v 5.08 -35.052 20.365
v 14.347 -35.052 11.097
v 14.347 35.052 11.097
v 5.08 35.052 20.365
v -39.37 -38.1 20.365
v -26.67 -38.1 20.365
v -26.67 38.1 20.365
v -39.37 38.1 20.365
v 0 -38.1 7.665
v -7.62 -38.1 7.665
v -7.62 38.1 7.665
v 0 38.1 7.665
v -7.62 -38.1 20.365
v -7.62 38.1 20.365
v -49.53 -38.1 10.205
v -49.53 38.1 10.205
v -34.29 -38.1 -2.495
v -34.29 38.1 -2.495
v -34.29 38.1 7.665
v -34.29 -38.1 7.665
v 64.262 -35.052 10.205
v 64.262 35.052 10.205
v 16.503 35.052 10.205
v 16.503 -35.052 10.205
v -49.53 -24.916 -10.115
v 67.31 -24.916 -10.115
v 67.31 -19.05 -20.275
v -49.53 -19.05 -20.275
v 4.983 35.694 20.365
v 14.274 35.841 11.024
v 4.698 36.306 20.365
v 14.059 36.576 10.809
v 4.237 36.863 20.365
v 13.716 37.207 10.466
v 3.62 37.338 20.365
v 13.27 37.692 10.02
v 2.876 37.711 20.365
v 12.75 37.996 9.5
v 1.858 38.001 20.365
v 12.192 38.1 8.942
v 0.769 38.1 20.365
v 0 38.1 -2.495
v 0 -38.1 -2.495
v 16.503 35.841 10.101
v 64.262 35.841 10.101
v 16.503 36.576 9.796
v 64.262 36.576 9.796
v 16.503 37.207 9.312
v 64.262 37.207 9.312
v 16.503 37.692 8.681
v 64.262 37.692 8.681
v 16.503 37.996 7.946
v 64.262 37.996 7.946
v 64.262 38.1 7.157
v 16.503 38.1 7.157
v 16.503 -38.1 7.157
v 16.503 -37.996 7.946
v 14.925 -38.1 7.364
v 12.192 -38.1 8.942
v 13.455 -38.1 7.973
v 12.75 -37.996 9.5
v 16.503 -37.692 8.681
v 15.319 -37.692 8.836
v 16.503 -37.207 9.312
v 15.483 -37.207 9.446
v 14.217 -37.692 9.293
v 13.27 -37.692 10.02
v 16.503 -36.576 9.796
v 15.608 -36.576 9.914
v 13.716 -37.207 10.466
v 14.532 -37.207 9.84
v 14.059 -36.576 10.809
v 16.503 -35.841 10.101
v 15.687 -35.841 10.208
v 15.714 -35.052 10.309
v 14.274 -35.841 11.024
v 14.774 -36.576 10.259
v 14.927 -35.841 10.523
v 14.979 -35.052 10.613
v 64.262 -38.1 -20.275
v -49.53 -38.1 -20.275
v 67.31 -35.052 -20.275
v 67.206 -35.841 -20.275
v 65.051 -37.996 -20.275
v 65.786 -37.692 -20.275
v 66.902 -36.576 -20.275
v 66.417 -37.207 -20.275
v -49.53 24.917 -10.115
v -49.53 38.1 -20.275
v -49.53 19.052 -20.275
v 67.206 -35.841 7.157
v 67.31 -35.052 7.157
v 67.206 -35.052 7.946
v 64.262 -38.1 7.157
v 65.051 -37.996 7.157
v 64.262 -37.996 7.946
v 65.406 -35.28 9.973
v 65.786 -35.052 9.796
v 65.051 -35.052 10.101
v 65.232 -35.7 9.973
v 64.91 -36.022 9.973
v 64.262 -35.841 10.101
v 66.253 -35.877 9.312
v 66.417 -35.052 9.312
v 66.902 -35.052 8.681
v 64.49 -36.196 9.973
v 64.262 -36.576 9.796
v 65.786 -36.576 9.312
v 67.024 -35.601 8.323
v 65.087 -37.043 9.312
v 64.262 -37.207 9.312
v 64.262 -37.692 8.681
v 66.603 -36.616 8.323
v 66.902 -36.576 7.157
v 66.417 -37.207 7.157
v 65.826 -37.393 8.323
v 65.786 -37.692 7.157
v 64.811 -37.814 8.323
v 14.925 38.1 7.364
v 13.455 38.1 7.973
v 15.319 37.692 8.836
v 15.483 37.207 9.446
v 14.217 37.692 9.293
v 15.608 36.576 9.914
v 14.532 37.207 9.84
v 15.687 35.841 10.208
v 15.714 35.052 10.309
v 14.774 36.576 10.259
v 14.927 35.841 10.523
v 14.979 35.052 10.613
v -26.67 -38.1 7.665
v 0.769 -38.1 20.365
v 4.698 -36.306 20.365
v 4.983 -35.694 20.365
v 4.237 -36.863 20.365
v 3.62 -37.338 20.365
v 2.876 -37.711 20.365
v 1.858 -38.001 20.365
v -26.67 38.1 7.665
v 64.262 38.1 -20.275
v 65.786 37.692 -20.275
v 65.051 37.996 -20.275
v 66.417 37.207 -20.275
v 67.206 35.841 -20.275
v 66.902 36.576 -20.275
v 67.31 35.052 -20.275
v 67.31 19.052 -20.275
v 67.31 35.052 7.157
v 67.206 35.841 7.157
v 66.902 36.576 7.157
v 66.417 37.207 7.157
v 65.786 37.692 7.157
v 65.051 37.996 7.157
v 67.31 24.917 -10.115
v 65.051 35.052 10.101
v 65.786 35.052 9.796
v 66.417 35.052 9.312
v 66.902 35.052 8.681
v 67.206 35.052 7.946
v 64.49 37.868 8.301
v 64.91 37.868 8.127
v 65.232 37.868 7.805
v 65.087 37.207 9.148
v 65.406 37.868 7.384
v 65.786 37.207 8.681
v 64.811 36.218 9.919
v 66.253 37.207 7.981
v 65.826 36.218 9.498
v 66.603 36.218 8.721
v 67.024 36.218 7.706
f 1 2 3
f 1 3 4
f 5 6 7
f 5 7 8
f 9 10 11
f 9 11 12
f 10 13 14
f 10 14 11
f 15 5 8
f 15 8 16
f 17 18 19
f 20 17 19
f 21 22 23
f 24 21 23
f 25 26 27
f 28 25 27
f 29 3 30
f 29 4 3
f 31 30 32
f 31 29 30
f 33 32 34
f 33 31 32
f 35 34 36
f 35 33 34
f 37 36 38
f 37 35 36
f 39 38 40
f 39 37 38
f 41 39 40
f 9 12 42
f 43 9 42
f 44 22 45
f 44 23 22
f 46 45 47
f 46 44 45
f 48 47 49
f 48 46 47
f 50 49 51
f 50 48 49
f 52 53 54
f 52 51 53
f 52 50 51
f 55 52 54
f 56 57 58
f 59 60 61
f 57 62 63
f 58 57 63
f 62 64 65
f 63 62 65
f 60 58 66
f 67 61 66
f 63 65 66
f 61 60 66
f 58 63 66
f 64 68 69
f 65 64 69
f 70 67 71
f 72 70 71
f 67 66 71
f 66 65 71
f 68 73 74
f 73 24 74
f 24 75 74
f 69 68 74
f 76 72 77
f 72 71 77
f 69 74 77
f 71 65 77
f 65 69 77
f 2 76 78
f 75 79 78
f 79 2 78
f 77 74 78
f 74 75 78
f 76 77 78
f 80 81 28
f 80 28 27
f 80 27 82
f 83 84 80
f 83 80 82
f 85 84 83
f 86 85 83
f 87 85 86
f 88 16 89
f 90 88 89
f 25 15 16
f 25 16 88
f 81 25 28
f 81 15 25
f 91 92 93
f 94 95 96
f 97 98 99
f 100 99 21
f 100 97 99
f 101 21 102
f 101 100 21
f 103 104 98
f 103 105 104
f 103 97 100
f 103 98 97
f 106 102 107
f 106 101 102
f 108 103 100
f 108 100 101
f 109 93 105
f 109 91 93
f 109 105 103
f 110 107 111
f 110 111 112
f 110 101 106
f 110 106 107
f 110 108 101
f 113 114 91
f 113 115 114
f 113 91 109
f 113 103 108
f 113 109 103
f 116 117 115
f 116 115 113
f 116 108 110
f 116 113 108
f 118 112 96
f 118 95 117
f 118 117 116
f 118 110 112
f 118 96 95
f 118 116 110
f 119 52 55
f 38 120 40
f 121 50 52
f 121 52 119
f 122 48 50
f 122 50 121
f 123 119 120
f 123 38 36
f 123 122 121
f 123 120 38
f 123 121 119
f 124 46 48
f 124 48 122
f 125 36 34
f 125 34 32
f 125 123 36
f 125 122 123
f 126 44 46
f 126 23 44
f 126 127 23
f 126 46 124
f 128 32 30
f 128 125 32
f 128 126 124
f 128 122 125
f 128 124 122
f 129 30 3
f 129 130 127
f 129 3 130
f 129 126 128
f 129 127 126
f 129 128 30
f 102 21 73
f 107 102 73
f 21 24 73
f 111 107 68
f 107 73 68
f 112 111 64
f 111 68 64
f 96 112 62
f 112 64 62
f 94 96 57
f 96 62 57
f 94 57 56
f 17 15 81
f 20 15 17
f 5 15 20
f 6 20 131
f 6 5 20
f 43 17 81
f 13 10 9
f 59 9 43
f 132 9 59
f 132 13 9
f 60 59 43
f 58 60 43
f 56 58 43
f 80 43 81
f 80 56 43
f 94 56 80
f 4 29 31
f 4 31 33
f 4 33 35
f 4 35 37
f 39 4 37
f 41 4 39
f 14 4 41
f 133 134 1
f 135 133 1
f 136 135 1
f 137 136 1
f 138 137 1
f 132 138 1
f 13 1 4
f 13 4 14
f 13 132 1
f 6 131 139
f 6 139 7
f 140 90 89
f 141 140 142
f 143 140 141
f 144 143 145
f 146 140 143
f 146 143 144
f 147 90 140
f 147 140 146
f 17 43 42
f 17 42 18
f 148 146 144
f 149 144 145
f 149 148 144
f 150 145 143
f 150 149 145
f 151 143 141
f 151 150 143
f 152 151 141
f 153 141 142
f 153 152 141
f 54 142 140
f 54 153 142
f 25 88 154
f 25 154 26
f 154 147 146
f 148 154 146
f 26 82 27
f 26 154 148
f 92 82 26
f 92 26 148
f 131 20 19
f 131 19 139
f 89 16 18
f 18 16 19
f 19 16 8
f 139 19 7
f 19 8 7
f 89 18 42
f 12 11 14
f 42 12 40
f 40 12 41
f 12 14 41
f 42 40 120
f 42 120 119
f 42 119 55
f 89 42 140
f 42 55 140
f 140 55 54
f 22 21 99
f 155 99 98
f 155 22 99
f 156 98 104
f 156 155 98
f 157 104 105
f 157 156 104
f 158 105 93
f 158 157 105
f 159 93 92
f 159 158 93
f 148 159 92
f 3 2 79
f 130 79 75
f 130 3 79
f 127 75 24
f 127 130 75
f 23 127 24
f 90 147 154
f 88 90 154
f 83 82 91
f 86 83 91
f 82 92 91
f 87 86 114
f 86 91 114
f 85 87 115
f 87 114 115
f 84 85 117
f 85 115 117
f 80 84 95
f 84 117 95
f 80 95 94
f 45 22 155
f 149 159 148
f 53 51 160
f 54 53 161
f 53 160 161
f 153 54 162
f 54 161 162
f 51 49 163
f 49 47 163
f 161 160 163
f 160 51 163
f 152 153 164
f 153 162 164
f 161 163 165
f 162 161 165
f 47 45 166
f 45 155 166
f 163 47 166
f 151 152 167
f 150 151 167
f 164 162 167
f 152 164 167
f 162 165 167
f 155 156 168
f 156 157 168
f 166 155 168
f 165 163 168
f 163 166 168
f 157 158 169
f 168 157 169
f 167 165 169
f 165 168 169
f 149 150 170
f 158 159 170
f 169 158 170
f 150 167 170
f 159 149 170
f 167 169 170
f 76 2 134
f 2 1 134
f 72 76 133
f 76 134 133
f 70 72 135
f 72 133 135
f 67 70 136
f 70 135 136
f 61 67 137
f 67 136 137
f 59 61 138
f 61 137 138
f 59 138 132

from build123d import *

# Parameters (mm, degrees)
F1_DEPTH = 38.1
F2_R     = 3.048
F4_DEPTH = 116.84


with BuildPart() as f1:
    # F0 (on Front) → F1 (new body, symmetric)
    with BuildSketch(Plane.XZ):
        Polygon((5.08, 10.2046737447), (15.24, 10.2046737447), (5.08, 20.3646737447), align=None)
        Polygon((-49.53, -20.2753262553), (67.31, -20.2753262553), (67.31, 10.2046737447), (15.24, 10.2046737447), (5.08, 10.2046737447), (5.08, 20.3646737447), (-7.62, 20.3646737447), (-7.62, 7.6646737447), (0, 7.6646737447), (0, -2.4953262553), (-34.29, -2.4953262553), (-34.29, 7.6646737447), (-26.67, 7.6646737447), (-26.67, 20.3646737447), (-39.37, 20.3646737447), (-49.53, 10.2046737447), align=None)
    extrude(amount=F1_DEPTH, both=True)

    # F2
    f2_edges = [f1.edges().sort_by_distance(p)[0] for p in [
        (10.16, -38.1, 15.284674),
        (15.24, 0, 10.204674),
        (67.31, -38.1, -5.035326),
        (67.31, 0, 10.204674),
        (41.275, 38.1, 10.204674),
        (67.31, 38.1, -5.035326),
        (10.16, 38.1, 15.284674),
        (41.275, -38.1, 10.204674),
    ]]
    fillet(f2_edges, radius=F2_R)

    # F3 (on face) → F4 (cut)
    with BuildSketch(Plane.YZ.offset(67.31)):
        Polygon((-19.05, -20.2753262553), (0, -20.2753262553), (19.05, -20.2753262553), (19.051521265, -20.2753262553), (24.9174, -10.1153262553), (0, -10.1153262553), (-24.915878735, -10.1153262553), align=None)
    extrude(amount=-F4_DEPTH, mode=Mode.SUBTRACT)


solid = f1.part
